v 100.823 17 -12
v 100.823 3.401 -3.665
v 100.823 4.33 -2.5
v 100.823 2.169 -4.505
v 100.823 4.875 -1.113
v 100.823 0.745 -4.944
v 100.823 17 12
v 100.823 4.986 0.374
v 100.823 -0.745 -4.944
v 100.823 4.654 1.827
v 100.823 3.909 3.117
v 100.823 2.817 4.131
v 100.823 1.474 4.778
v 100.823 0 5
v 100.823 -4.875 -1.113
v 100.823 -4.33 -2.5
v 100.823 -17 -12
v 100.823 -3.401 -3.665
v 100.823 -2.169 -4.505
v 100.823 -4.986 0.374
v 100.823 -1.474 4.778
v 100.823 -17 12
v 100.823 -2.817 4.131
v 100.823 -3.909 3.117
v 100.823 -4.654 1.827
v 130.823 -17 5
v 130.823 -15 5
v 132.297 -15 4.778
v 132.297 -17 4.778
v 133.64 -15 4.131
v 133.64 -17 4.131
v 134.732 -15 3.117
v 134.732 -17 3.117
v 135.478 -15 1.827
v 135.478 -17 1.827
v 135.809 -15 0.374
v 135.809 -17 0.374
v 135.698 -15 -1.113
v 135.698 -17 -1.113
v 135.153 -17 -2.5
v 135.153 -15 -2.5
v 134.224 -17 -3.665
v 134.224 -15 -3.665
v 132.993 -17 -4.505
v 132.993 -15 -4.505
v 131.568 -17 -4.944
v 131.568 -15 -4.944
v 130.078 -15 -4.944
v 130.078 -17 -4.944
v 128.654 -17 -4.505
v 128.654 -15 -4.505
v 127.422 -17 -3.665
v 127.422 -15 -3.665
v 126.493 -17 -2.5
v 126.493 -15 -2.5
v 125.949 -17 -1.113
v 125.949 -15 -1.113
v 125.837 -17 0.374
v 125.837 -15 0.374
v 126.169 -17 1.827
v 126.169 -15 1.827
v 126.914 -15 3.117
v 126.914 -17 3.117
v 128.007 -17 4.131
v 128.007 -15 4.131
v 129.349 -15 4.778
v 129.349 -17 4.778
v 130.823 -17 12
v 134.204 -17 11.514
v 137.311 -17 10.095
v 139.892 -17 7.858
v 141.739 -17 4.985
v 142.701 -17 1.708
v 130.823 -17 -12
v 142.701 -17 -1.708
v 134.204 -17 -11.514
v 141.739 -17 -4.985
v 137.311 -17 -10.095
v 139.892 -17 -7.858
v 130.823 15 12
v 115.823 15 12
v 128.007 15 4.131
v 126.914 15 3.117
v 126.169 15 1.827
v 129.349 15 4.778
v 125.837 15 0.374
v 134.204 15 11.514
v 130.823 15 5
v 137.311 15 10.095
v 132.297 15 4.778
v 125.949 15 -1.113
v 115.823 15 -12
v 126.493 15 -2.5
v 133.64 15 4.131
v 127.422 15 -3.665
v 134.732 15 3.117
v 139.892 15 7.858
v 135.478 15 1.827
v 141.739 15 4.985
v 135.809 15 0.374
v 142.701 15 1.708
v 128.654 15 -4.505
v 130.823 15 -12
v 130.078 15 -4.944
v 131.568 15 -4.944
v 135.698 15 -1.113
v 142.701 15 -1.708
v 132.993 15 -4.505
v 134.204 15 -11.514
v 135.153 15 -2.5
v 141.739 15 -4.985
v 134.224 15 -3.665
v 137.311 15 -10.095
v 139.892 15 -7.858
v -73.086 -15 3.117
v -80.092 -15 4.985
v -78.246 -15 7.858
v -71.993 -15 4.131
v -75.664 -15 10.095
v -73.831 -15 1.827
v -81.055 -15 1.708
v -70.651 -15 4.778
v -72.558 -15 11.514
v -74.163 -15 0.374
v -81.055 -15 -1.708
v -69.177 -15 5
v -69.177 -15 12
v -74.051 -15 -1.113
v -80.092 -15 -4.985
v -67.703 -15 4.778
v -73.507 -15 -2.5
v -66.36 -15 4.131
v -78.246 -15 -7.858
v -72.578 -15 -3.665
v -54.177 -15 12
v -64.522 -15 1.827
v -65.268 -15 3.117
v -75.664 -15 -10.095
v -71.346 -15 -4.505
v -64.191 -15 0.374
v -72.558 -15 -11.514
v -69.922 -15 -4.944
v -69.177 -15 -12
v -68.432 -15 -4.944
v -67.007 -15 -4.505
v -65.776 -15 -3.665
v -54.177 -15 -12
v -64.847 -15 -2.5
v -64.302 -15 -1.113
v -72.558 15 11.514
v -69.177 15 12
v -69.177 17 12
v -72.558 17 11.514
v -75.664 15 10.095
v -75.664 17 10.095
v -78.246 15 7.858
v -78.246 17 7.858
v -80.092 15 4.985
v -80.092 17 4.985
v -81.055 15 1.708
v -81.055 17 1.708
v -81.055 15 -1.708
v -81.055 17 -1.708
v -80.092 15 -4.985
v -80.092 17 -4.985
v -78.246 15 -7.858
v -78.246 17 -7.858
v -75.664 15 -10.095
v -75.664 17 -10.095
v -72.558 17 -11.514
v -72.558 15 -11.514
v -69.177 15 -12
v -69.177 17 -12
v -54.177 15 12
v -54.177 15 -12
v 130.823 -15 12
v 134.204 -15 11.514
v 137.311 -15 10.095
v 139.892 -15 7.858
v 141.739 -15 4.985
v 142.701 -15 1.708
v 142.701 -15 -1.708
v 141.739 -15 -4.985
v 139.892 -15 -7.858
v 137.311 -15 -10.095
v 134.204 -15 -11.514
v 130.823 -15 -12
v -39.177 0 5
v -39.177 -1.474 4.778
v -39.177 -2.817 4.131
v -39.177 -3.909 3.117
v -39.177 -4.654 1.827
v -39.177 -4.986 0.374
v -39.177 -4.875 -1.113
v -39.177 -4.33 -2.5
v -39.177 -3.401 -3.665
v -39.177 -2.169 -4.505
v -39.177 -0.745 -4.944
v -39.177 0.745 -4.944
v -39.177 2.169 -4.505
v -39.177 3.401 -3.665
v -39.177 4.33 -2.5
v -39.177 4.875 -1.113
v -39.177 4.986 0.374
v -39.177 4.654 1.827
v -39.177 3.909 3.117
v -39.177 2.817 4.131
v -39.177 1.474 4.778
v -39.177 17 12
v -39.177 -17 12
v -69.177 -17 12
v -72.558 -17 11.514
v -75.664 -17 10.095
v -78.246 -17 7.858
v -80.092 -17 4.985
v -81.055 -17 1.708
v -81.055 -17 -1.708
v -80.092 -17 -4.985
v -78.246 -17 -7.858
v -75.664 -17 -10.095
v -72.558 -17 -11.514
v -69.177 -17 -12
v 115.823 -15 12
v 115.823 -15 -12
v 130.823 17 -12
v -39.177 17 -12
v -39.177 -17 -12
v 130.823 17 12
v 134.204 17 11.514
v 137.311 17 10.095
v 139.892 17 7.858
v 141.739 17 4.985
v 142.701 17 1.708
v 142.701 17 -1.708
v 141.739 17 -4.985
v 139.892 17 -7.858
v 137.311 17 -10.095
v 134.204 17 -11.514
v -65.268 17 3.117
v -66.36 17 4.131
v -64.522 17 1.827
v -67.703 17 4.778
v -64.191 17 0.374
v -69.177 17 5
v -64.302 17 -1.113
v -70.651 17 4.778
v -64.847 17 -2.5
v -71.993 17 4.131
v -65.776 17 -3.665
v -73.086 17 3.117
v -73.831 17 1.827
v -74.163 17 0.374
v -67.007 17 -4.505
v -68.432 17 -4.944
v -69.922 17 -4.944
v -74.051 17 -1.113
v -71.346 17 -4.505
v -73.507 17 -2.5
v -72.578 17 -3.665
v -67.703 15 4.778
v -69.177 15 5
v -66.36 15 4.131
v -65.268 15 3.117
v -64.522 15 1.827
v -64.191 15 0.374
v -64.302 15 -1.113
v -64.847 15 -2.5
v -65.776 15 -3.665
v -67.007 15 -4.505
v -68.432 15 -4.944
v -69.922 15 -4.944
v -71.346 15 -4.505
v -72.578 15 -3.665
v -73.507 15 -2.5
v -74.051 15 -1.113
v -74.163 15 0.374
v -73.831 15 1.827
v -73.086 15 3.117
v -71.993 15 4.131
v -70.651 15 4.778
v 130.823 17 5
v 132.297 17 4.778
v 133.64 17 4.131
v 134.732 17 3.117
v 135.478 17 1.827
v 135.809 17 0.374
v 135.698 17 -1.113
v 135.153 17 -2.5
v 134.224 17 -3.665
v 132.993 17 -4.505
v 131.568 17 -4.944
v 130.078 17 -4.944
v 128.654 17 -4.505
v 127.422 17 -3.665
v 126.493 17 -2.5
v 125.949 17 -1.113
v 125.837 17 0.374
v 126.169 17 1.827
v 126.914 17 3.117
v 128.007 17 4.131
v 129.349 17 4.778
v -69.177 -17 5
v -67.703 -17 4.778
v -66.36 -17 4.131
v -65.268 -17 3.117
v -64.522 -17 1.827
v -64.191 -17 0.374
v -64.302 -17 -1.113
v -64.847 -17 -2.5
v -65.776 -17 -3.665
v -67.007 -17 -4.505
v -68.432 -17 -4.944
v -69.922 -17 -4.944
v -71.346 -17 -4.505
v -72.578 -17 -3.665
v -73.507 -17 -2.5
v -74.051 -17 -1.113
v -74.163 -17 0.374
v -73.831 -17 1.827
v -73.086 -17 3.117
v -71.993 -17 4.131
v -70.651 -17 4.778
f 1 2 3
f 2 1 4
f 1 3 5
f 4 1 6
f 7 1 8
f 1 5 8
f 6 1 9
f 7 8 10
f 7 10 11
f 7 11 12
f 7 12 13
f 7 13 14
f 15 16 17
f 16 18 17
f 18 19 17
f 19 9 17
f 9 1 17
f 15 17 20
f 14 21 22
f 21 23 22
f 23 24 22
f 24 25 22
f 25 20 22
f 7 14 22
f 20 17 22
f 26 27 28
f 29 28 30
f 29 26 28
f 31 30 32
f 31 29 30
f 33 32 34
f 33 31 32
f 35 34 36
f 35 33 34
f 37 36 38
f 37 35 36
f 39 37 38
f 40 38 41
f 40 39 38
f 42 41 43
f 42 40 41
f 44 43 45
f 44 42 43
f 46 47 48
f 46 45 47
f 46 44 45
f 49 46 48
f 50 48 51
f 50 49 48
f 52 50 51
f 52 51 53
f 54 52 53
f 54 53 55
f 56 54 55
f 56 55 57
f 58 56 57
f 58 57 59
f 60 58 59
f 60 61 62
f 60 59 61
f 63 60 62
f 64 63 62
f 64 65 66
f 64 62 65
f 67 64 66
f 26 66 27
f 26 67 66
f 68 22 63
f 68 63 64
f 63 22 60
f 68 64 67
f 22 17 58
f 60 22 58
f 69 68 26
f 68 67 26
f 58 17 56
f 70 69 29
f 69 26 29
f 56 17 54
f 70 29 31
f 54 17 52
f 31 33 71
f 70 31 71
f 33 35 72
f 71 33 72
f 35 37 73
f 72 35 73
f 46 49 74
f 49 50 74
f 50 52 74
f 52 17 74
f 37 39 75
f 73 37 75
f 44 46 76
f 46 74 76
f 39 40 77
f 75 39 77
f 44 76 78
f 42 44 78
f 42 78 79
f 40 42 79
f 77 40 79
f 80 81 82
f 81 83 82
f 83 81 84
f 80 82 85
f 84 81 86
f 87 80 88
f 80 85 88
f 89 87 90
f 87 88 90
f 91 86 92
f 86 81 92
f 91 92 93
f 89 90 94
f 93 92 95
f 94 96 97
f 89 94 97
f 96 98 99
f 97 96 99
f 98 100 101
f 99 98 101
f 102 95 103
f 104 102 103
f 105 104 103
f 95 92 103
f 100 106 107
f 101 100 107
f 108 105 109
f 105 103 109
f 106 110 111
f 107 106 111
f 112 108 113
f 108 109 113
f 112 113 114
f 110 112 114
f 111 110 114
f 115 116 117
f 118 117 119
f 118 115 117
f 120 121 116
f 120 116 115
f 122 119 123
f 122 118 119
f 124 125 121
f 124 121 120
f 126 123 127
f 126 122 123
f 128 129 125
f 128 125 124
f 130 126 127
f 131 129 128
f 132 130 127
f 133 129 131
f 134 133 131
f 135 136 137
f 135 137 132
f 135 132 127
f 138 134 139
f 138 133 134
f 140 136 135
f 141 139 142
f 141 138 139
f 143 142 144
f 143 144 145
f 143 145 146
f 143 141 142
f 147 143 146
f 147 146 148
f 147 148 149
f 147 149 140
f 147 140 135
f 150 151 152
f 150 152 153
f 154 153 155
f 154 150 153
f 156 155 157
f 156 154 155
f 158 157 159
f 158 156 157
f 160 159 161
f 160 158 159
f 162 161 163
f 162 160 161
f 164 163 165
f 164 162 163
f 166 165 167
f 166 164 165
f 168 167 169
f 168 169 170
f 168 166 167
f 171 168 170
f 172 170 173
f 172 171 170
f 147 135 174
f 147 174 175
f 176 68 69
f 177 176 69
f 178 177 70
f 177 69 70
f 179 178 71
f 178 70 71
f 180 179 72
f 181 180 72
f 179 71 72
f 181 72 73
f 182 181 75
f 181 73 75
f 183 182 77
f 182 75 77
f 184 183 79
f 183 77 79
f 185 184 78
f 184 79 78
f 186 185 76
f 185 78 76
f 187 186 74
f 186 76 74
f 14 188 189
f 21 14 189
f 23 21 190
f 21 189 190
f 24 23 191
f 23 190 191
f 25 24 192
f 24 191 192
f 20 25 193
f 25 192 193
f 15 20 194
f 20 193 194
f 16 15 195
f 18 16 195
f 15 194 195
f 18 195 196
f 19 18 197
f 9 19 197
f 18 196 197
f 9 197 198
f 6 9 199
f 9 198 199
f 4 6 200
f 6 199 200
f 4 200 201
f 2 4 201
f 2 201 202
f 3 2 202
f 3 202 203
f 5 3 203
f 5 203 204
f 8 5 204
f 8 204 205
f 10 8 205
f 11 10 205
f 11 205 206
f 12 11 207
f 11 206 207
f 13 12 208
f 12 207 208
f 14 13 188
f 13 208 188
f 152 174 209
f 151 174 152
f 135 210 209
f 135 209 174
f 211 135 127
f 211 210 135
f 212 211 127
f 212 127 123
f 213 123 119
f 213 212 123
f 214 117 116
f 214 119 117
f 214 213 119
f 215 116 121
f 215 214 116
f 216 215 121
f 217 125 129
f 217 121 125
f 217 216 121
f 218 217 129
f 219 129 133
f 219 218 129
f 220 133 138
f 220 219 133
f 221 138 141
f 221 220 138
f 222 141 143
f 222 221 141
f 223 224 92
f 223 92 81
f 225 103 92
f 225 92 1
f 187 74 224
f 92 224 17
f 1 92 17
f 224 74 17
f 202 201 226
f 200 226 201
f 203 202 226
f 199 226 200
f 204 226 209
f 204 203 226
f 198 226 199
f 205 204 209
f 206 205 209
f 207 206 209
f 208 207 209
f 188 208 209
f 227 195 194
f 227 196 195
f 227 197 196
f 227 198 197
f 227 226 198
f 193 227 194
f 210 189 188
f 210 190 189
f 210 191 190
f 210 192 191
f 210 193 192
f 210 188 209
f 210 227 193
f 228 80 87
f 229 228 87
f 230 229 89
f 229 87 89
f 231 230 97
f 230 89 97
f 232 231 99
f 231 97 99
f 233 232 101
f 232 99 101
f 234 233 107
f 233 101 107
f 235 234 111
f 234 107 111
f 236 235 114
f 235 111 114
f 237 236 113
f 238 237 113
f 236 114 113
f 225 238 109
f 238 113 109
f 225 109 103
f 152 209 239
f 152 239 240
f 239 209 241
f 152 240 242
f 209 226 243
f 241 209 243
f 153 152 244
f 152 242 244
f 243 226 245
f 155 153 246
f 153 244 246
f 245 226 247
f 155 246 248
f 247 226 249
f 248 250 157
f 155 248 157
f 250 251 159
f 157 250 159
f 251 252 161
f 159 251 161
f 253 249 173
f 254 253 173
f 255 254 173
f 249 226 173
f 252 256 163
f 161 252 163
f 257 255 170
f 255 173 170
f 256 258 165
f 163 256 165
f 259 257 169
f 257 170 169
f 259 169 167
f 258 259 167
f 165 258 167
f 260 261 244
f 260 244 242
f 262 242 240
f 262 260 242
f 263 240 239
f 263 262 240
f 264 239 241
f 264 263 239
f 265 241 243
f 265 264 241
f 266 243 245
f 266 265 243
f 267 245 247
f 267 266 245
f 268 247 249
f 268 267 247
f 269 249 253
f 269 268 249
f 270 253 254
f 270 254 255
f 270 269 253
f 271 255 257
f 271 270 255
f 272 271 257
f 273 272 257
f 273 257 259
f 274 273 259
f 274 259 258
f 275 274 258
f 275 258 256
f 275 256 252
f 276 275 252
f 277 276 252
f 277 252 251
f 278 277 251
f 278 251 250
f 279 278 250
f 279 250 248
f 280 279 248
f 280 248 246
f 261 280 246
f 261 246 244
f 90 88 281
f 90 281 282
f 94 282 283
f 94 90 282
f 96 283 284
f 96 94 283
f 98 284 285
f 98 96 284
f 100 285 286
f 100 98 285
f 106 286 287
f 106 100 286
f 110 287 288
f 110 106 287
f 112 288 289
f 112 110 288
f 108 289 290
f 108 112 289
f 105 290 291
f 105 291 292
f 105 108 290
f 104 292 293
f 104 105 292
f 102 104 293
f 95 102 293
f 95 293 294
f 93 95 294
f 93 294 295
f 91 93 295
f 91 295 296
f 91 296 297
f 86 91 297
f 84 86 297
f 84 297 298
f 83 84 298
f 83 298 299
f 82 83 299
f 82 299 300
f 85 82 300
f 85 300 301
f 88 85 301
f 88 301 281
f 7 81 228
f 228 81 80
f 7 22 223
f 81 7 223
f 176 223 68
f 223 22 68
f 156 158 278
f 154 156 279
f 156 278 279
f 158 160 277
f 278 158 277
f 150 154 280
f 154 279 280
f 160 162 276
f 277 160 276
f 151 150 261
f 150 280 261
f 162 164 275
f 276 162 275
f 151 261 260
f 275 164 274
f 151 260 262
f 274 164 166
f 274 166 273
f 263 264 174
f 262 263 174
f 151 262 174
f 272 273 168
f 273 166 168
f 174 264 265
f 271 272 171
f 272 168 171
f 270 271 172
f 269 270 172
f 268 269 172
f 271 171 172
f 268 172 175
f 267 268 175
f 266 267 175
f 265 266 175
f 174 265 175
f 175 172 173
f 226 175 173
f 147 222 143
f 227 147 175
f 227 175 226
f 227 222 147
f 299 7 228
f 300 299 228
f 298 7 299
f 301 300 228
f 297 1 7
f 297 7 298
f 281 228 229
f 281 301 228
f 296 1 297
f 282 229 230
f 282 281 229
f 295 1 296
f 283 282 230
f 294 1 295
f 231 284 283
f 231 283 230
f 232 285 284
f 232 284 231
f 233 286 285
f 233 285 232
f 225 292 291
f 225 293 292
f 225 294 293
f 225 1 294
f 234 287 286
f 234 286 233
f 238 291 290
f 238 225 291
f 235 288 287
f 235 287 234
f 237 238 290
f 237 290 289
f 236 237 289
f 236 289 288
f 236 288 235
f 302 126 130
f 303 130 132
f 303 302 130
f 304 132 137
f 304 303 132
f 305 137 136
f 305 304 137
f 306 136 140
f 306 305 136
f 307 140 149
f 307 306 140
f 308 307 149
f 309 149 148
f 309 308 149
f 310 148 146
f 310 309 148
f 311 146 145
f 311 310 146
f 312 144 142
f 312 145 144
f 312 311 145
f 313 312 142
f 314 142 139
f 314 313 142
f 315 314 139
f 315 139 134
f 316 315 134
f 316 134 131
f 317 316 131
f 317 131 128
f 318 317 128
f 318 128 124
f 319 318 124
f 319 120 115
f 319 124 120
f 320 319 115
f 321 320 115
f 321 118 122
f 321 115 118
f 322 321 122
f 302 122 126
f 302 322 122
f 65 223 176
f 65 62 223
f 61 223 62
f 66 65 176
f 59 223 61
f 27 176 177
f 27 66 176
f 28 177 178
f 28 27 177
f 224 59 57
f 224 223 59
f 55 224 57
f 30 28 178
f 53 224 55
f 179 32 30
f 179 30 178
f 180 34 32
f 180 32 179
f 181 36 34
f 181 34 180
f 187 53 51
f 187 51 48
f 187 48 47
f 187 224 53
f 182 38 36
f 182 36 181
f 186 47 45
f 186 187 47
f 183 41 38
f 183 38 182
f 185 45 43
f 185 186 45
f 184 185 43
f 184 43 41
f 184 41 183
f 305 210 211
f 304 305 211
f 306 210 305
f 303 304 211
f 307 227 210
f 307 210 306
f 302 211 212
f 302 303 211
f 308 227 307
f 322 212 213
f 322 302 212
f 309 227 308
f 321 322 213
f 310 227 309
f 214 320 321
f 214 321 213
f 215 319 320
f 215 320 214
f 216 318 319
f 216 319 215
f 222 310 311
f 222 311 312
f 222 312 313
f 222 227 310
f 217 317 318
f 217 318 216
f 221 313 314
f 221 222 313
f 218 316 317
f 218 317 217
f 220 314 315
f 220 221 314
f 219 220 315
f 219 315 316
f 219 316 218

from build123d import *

# Parameters (mm, degrees)
BOSS_EXTRUDE1_DEPTH        = 17
BOSS_EXTRUDE1_DEPTH_BACK   = 17
SKETCH1_R                  = 5
BOSS_EXTRUDE1_2_DEPTH      = 17
BOSS_EXTRUDE1_2_DEPTH_BACK = 17
SKETCH3_R                  = 5
BOSS_EXTRUDE2_DEPTH        = 140
CUT_EXTRUDE1_DEPTH         = 15
CUT_EXTRUDE1_DEPTH_BACK    = 15


with BuildPart() as part:
    # Sketch1 → Boss-Extrude1 (new, two sides: drawn at the far end of the back side and taken through both)
    with BuildSketch(Plane(origin=(0, 0, 0), x_dir=(1, 0, 0), z_dir=(0, 1, 0)).offset(-BOSS_EXTRUDE1_DEPTH_BACK)):
        with BuildLine():
            Line((-69.176769869, 12), (-39.176769869, 12))
            Line((-39.176769869, 12), (-39.176769869, -12))
            Line((-39.176769869, -12), (-69.176769869, -12))
            ThreePointArc((-69.176769869, -12), (-81.176769869, 0), (-69.176769869, 12))
        make_face()
        with Locations(Location((-69.176769869, 0, 0), (0, 0, 270))):
            Circle(SKETCH1_R, mode=Mode.SUBTRACT)
    extrude(amount=BOSS_EXTRUDE1_DEPTH + BOSS_EXTRUDE1_DEPTH_BACK)



with BuildPart() as body_2:
    # Sketch1 → Boss-Extrude1 2 (new, two sides: drawn at the far end of the back side and taken through both)
    with BuildSketch(Plane(origin=(0, 0, 0), x_dir=(1, 0, 0), z_dir=(0, 1, 0)).offset(-BOSS_EXTRUDE1_2_DEPTH_BACK)):
        with BuildLine():
            Line((130.823230131, 12), (100.823230131, 12))
            Line((100.823230131, 12), (100.823230131, -12))
            Line((100.823230131, -12), (130.823230131, -12))
            ThreePointArc((130.823230131, -12), (142.823230131, 0), (130.823230131, 12))
        make_face()
        with Locations(Location((130.823230131, 0, 0), (0, 0, 270))):
            Circle(SKETCH1_R, mode=Mode.SUBTRACT)
    extrude(amount=BOSS_EXTRUDE1_2_DEPTH + BOSS_EXTRUDE1_2_DEPTH_BACK)


with BuildPart() as part_1:
    add(part.part)

    add(body_2.part)  # Boss-Extrude2 merges body 2
    # Sketch3 → Boss-Extrude2 (add)
    with BuildSketch(Plane(origin=(-39.176769869, 0, 0), x_dir=(0, 0, -1), z_dir=(1, 0, 0))):
        with Locations(Location((0, 0, 0), (0, 0, 180))):
            Circle(SKETCH3_R)
    extrude(amount=BOSS_EXTRUDE2_DEPTH)

    # Sketch4 → Cut-Extrude1 (cut, two sides: drawn at the far end of the back side and taken through both)
    with BuildSketch(Plane(origin=(0, 0, 0), x_dir=(1, 0, 0), z_dir=(0, 1, 0)).offset(-CUT_EXTRUDE1_DEPTH_BACK)):
        with BuildLine():
            Line((115.823230131, -12), (130.823230131, -12))
            ThreePointArc((130.823230131, -12), (142.823230131, 0), (130.823230131, 12))
            Line((130.823230131, 12), (115.823230131, 12))
            Line((115.823230131, 12), (115.823230131, -12))
        make_face()
        with BuildLine():
            Line((-69.176769869, -12), (-54.176769869, -12))
            Line((-54.176769869, -12), (-54.176769869, 12))
            Line((-54.176769869, 12), (-69.176769869, 12))
            ThreePointArc((-69.176769869, 12), (-81.176769869, 0), (-69.176769869, -12))
        make_face()
    extrude(amount=CUT_EXTRUDE1_DEPTH + CUT_EXTRUDE1_DEPTH_BACK, mode=Mode.SUBTRACT)


solid = part_1.part
